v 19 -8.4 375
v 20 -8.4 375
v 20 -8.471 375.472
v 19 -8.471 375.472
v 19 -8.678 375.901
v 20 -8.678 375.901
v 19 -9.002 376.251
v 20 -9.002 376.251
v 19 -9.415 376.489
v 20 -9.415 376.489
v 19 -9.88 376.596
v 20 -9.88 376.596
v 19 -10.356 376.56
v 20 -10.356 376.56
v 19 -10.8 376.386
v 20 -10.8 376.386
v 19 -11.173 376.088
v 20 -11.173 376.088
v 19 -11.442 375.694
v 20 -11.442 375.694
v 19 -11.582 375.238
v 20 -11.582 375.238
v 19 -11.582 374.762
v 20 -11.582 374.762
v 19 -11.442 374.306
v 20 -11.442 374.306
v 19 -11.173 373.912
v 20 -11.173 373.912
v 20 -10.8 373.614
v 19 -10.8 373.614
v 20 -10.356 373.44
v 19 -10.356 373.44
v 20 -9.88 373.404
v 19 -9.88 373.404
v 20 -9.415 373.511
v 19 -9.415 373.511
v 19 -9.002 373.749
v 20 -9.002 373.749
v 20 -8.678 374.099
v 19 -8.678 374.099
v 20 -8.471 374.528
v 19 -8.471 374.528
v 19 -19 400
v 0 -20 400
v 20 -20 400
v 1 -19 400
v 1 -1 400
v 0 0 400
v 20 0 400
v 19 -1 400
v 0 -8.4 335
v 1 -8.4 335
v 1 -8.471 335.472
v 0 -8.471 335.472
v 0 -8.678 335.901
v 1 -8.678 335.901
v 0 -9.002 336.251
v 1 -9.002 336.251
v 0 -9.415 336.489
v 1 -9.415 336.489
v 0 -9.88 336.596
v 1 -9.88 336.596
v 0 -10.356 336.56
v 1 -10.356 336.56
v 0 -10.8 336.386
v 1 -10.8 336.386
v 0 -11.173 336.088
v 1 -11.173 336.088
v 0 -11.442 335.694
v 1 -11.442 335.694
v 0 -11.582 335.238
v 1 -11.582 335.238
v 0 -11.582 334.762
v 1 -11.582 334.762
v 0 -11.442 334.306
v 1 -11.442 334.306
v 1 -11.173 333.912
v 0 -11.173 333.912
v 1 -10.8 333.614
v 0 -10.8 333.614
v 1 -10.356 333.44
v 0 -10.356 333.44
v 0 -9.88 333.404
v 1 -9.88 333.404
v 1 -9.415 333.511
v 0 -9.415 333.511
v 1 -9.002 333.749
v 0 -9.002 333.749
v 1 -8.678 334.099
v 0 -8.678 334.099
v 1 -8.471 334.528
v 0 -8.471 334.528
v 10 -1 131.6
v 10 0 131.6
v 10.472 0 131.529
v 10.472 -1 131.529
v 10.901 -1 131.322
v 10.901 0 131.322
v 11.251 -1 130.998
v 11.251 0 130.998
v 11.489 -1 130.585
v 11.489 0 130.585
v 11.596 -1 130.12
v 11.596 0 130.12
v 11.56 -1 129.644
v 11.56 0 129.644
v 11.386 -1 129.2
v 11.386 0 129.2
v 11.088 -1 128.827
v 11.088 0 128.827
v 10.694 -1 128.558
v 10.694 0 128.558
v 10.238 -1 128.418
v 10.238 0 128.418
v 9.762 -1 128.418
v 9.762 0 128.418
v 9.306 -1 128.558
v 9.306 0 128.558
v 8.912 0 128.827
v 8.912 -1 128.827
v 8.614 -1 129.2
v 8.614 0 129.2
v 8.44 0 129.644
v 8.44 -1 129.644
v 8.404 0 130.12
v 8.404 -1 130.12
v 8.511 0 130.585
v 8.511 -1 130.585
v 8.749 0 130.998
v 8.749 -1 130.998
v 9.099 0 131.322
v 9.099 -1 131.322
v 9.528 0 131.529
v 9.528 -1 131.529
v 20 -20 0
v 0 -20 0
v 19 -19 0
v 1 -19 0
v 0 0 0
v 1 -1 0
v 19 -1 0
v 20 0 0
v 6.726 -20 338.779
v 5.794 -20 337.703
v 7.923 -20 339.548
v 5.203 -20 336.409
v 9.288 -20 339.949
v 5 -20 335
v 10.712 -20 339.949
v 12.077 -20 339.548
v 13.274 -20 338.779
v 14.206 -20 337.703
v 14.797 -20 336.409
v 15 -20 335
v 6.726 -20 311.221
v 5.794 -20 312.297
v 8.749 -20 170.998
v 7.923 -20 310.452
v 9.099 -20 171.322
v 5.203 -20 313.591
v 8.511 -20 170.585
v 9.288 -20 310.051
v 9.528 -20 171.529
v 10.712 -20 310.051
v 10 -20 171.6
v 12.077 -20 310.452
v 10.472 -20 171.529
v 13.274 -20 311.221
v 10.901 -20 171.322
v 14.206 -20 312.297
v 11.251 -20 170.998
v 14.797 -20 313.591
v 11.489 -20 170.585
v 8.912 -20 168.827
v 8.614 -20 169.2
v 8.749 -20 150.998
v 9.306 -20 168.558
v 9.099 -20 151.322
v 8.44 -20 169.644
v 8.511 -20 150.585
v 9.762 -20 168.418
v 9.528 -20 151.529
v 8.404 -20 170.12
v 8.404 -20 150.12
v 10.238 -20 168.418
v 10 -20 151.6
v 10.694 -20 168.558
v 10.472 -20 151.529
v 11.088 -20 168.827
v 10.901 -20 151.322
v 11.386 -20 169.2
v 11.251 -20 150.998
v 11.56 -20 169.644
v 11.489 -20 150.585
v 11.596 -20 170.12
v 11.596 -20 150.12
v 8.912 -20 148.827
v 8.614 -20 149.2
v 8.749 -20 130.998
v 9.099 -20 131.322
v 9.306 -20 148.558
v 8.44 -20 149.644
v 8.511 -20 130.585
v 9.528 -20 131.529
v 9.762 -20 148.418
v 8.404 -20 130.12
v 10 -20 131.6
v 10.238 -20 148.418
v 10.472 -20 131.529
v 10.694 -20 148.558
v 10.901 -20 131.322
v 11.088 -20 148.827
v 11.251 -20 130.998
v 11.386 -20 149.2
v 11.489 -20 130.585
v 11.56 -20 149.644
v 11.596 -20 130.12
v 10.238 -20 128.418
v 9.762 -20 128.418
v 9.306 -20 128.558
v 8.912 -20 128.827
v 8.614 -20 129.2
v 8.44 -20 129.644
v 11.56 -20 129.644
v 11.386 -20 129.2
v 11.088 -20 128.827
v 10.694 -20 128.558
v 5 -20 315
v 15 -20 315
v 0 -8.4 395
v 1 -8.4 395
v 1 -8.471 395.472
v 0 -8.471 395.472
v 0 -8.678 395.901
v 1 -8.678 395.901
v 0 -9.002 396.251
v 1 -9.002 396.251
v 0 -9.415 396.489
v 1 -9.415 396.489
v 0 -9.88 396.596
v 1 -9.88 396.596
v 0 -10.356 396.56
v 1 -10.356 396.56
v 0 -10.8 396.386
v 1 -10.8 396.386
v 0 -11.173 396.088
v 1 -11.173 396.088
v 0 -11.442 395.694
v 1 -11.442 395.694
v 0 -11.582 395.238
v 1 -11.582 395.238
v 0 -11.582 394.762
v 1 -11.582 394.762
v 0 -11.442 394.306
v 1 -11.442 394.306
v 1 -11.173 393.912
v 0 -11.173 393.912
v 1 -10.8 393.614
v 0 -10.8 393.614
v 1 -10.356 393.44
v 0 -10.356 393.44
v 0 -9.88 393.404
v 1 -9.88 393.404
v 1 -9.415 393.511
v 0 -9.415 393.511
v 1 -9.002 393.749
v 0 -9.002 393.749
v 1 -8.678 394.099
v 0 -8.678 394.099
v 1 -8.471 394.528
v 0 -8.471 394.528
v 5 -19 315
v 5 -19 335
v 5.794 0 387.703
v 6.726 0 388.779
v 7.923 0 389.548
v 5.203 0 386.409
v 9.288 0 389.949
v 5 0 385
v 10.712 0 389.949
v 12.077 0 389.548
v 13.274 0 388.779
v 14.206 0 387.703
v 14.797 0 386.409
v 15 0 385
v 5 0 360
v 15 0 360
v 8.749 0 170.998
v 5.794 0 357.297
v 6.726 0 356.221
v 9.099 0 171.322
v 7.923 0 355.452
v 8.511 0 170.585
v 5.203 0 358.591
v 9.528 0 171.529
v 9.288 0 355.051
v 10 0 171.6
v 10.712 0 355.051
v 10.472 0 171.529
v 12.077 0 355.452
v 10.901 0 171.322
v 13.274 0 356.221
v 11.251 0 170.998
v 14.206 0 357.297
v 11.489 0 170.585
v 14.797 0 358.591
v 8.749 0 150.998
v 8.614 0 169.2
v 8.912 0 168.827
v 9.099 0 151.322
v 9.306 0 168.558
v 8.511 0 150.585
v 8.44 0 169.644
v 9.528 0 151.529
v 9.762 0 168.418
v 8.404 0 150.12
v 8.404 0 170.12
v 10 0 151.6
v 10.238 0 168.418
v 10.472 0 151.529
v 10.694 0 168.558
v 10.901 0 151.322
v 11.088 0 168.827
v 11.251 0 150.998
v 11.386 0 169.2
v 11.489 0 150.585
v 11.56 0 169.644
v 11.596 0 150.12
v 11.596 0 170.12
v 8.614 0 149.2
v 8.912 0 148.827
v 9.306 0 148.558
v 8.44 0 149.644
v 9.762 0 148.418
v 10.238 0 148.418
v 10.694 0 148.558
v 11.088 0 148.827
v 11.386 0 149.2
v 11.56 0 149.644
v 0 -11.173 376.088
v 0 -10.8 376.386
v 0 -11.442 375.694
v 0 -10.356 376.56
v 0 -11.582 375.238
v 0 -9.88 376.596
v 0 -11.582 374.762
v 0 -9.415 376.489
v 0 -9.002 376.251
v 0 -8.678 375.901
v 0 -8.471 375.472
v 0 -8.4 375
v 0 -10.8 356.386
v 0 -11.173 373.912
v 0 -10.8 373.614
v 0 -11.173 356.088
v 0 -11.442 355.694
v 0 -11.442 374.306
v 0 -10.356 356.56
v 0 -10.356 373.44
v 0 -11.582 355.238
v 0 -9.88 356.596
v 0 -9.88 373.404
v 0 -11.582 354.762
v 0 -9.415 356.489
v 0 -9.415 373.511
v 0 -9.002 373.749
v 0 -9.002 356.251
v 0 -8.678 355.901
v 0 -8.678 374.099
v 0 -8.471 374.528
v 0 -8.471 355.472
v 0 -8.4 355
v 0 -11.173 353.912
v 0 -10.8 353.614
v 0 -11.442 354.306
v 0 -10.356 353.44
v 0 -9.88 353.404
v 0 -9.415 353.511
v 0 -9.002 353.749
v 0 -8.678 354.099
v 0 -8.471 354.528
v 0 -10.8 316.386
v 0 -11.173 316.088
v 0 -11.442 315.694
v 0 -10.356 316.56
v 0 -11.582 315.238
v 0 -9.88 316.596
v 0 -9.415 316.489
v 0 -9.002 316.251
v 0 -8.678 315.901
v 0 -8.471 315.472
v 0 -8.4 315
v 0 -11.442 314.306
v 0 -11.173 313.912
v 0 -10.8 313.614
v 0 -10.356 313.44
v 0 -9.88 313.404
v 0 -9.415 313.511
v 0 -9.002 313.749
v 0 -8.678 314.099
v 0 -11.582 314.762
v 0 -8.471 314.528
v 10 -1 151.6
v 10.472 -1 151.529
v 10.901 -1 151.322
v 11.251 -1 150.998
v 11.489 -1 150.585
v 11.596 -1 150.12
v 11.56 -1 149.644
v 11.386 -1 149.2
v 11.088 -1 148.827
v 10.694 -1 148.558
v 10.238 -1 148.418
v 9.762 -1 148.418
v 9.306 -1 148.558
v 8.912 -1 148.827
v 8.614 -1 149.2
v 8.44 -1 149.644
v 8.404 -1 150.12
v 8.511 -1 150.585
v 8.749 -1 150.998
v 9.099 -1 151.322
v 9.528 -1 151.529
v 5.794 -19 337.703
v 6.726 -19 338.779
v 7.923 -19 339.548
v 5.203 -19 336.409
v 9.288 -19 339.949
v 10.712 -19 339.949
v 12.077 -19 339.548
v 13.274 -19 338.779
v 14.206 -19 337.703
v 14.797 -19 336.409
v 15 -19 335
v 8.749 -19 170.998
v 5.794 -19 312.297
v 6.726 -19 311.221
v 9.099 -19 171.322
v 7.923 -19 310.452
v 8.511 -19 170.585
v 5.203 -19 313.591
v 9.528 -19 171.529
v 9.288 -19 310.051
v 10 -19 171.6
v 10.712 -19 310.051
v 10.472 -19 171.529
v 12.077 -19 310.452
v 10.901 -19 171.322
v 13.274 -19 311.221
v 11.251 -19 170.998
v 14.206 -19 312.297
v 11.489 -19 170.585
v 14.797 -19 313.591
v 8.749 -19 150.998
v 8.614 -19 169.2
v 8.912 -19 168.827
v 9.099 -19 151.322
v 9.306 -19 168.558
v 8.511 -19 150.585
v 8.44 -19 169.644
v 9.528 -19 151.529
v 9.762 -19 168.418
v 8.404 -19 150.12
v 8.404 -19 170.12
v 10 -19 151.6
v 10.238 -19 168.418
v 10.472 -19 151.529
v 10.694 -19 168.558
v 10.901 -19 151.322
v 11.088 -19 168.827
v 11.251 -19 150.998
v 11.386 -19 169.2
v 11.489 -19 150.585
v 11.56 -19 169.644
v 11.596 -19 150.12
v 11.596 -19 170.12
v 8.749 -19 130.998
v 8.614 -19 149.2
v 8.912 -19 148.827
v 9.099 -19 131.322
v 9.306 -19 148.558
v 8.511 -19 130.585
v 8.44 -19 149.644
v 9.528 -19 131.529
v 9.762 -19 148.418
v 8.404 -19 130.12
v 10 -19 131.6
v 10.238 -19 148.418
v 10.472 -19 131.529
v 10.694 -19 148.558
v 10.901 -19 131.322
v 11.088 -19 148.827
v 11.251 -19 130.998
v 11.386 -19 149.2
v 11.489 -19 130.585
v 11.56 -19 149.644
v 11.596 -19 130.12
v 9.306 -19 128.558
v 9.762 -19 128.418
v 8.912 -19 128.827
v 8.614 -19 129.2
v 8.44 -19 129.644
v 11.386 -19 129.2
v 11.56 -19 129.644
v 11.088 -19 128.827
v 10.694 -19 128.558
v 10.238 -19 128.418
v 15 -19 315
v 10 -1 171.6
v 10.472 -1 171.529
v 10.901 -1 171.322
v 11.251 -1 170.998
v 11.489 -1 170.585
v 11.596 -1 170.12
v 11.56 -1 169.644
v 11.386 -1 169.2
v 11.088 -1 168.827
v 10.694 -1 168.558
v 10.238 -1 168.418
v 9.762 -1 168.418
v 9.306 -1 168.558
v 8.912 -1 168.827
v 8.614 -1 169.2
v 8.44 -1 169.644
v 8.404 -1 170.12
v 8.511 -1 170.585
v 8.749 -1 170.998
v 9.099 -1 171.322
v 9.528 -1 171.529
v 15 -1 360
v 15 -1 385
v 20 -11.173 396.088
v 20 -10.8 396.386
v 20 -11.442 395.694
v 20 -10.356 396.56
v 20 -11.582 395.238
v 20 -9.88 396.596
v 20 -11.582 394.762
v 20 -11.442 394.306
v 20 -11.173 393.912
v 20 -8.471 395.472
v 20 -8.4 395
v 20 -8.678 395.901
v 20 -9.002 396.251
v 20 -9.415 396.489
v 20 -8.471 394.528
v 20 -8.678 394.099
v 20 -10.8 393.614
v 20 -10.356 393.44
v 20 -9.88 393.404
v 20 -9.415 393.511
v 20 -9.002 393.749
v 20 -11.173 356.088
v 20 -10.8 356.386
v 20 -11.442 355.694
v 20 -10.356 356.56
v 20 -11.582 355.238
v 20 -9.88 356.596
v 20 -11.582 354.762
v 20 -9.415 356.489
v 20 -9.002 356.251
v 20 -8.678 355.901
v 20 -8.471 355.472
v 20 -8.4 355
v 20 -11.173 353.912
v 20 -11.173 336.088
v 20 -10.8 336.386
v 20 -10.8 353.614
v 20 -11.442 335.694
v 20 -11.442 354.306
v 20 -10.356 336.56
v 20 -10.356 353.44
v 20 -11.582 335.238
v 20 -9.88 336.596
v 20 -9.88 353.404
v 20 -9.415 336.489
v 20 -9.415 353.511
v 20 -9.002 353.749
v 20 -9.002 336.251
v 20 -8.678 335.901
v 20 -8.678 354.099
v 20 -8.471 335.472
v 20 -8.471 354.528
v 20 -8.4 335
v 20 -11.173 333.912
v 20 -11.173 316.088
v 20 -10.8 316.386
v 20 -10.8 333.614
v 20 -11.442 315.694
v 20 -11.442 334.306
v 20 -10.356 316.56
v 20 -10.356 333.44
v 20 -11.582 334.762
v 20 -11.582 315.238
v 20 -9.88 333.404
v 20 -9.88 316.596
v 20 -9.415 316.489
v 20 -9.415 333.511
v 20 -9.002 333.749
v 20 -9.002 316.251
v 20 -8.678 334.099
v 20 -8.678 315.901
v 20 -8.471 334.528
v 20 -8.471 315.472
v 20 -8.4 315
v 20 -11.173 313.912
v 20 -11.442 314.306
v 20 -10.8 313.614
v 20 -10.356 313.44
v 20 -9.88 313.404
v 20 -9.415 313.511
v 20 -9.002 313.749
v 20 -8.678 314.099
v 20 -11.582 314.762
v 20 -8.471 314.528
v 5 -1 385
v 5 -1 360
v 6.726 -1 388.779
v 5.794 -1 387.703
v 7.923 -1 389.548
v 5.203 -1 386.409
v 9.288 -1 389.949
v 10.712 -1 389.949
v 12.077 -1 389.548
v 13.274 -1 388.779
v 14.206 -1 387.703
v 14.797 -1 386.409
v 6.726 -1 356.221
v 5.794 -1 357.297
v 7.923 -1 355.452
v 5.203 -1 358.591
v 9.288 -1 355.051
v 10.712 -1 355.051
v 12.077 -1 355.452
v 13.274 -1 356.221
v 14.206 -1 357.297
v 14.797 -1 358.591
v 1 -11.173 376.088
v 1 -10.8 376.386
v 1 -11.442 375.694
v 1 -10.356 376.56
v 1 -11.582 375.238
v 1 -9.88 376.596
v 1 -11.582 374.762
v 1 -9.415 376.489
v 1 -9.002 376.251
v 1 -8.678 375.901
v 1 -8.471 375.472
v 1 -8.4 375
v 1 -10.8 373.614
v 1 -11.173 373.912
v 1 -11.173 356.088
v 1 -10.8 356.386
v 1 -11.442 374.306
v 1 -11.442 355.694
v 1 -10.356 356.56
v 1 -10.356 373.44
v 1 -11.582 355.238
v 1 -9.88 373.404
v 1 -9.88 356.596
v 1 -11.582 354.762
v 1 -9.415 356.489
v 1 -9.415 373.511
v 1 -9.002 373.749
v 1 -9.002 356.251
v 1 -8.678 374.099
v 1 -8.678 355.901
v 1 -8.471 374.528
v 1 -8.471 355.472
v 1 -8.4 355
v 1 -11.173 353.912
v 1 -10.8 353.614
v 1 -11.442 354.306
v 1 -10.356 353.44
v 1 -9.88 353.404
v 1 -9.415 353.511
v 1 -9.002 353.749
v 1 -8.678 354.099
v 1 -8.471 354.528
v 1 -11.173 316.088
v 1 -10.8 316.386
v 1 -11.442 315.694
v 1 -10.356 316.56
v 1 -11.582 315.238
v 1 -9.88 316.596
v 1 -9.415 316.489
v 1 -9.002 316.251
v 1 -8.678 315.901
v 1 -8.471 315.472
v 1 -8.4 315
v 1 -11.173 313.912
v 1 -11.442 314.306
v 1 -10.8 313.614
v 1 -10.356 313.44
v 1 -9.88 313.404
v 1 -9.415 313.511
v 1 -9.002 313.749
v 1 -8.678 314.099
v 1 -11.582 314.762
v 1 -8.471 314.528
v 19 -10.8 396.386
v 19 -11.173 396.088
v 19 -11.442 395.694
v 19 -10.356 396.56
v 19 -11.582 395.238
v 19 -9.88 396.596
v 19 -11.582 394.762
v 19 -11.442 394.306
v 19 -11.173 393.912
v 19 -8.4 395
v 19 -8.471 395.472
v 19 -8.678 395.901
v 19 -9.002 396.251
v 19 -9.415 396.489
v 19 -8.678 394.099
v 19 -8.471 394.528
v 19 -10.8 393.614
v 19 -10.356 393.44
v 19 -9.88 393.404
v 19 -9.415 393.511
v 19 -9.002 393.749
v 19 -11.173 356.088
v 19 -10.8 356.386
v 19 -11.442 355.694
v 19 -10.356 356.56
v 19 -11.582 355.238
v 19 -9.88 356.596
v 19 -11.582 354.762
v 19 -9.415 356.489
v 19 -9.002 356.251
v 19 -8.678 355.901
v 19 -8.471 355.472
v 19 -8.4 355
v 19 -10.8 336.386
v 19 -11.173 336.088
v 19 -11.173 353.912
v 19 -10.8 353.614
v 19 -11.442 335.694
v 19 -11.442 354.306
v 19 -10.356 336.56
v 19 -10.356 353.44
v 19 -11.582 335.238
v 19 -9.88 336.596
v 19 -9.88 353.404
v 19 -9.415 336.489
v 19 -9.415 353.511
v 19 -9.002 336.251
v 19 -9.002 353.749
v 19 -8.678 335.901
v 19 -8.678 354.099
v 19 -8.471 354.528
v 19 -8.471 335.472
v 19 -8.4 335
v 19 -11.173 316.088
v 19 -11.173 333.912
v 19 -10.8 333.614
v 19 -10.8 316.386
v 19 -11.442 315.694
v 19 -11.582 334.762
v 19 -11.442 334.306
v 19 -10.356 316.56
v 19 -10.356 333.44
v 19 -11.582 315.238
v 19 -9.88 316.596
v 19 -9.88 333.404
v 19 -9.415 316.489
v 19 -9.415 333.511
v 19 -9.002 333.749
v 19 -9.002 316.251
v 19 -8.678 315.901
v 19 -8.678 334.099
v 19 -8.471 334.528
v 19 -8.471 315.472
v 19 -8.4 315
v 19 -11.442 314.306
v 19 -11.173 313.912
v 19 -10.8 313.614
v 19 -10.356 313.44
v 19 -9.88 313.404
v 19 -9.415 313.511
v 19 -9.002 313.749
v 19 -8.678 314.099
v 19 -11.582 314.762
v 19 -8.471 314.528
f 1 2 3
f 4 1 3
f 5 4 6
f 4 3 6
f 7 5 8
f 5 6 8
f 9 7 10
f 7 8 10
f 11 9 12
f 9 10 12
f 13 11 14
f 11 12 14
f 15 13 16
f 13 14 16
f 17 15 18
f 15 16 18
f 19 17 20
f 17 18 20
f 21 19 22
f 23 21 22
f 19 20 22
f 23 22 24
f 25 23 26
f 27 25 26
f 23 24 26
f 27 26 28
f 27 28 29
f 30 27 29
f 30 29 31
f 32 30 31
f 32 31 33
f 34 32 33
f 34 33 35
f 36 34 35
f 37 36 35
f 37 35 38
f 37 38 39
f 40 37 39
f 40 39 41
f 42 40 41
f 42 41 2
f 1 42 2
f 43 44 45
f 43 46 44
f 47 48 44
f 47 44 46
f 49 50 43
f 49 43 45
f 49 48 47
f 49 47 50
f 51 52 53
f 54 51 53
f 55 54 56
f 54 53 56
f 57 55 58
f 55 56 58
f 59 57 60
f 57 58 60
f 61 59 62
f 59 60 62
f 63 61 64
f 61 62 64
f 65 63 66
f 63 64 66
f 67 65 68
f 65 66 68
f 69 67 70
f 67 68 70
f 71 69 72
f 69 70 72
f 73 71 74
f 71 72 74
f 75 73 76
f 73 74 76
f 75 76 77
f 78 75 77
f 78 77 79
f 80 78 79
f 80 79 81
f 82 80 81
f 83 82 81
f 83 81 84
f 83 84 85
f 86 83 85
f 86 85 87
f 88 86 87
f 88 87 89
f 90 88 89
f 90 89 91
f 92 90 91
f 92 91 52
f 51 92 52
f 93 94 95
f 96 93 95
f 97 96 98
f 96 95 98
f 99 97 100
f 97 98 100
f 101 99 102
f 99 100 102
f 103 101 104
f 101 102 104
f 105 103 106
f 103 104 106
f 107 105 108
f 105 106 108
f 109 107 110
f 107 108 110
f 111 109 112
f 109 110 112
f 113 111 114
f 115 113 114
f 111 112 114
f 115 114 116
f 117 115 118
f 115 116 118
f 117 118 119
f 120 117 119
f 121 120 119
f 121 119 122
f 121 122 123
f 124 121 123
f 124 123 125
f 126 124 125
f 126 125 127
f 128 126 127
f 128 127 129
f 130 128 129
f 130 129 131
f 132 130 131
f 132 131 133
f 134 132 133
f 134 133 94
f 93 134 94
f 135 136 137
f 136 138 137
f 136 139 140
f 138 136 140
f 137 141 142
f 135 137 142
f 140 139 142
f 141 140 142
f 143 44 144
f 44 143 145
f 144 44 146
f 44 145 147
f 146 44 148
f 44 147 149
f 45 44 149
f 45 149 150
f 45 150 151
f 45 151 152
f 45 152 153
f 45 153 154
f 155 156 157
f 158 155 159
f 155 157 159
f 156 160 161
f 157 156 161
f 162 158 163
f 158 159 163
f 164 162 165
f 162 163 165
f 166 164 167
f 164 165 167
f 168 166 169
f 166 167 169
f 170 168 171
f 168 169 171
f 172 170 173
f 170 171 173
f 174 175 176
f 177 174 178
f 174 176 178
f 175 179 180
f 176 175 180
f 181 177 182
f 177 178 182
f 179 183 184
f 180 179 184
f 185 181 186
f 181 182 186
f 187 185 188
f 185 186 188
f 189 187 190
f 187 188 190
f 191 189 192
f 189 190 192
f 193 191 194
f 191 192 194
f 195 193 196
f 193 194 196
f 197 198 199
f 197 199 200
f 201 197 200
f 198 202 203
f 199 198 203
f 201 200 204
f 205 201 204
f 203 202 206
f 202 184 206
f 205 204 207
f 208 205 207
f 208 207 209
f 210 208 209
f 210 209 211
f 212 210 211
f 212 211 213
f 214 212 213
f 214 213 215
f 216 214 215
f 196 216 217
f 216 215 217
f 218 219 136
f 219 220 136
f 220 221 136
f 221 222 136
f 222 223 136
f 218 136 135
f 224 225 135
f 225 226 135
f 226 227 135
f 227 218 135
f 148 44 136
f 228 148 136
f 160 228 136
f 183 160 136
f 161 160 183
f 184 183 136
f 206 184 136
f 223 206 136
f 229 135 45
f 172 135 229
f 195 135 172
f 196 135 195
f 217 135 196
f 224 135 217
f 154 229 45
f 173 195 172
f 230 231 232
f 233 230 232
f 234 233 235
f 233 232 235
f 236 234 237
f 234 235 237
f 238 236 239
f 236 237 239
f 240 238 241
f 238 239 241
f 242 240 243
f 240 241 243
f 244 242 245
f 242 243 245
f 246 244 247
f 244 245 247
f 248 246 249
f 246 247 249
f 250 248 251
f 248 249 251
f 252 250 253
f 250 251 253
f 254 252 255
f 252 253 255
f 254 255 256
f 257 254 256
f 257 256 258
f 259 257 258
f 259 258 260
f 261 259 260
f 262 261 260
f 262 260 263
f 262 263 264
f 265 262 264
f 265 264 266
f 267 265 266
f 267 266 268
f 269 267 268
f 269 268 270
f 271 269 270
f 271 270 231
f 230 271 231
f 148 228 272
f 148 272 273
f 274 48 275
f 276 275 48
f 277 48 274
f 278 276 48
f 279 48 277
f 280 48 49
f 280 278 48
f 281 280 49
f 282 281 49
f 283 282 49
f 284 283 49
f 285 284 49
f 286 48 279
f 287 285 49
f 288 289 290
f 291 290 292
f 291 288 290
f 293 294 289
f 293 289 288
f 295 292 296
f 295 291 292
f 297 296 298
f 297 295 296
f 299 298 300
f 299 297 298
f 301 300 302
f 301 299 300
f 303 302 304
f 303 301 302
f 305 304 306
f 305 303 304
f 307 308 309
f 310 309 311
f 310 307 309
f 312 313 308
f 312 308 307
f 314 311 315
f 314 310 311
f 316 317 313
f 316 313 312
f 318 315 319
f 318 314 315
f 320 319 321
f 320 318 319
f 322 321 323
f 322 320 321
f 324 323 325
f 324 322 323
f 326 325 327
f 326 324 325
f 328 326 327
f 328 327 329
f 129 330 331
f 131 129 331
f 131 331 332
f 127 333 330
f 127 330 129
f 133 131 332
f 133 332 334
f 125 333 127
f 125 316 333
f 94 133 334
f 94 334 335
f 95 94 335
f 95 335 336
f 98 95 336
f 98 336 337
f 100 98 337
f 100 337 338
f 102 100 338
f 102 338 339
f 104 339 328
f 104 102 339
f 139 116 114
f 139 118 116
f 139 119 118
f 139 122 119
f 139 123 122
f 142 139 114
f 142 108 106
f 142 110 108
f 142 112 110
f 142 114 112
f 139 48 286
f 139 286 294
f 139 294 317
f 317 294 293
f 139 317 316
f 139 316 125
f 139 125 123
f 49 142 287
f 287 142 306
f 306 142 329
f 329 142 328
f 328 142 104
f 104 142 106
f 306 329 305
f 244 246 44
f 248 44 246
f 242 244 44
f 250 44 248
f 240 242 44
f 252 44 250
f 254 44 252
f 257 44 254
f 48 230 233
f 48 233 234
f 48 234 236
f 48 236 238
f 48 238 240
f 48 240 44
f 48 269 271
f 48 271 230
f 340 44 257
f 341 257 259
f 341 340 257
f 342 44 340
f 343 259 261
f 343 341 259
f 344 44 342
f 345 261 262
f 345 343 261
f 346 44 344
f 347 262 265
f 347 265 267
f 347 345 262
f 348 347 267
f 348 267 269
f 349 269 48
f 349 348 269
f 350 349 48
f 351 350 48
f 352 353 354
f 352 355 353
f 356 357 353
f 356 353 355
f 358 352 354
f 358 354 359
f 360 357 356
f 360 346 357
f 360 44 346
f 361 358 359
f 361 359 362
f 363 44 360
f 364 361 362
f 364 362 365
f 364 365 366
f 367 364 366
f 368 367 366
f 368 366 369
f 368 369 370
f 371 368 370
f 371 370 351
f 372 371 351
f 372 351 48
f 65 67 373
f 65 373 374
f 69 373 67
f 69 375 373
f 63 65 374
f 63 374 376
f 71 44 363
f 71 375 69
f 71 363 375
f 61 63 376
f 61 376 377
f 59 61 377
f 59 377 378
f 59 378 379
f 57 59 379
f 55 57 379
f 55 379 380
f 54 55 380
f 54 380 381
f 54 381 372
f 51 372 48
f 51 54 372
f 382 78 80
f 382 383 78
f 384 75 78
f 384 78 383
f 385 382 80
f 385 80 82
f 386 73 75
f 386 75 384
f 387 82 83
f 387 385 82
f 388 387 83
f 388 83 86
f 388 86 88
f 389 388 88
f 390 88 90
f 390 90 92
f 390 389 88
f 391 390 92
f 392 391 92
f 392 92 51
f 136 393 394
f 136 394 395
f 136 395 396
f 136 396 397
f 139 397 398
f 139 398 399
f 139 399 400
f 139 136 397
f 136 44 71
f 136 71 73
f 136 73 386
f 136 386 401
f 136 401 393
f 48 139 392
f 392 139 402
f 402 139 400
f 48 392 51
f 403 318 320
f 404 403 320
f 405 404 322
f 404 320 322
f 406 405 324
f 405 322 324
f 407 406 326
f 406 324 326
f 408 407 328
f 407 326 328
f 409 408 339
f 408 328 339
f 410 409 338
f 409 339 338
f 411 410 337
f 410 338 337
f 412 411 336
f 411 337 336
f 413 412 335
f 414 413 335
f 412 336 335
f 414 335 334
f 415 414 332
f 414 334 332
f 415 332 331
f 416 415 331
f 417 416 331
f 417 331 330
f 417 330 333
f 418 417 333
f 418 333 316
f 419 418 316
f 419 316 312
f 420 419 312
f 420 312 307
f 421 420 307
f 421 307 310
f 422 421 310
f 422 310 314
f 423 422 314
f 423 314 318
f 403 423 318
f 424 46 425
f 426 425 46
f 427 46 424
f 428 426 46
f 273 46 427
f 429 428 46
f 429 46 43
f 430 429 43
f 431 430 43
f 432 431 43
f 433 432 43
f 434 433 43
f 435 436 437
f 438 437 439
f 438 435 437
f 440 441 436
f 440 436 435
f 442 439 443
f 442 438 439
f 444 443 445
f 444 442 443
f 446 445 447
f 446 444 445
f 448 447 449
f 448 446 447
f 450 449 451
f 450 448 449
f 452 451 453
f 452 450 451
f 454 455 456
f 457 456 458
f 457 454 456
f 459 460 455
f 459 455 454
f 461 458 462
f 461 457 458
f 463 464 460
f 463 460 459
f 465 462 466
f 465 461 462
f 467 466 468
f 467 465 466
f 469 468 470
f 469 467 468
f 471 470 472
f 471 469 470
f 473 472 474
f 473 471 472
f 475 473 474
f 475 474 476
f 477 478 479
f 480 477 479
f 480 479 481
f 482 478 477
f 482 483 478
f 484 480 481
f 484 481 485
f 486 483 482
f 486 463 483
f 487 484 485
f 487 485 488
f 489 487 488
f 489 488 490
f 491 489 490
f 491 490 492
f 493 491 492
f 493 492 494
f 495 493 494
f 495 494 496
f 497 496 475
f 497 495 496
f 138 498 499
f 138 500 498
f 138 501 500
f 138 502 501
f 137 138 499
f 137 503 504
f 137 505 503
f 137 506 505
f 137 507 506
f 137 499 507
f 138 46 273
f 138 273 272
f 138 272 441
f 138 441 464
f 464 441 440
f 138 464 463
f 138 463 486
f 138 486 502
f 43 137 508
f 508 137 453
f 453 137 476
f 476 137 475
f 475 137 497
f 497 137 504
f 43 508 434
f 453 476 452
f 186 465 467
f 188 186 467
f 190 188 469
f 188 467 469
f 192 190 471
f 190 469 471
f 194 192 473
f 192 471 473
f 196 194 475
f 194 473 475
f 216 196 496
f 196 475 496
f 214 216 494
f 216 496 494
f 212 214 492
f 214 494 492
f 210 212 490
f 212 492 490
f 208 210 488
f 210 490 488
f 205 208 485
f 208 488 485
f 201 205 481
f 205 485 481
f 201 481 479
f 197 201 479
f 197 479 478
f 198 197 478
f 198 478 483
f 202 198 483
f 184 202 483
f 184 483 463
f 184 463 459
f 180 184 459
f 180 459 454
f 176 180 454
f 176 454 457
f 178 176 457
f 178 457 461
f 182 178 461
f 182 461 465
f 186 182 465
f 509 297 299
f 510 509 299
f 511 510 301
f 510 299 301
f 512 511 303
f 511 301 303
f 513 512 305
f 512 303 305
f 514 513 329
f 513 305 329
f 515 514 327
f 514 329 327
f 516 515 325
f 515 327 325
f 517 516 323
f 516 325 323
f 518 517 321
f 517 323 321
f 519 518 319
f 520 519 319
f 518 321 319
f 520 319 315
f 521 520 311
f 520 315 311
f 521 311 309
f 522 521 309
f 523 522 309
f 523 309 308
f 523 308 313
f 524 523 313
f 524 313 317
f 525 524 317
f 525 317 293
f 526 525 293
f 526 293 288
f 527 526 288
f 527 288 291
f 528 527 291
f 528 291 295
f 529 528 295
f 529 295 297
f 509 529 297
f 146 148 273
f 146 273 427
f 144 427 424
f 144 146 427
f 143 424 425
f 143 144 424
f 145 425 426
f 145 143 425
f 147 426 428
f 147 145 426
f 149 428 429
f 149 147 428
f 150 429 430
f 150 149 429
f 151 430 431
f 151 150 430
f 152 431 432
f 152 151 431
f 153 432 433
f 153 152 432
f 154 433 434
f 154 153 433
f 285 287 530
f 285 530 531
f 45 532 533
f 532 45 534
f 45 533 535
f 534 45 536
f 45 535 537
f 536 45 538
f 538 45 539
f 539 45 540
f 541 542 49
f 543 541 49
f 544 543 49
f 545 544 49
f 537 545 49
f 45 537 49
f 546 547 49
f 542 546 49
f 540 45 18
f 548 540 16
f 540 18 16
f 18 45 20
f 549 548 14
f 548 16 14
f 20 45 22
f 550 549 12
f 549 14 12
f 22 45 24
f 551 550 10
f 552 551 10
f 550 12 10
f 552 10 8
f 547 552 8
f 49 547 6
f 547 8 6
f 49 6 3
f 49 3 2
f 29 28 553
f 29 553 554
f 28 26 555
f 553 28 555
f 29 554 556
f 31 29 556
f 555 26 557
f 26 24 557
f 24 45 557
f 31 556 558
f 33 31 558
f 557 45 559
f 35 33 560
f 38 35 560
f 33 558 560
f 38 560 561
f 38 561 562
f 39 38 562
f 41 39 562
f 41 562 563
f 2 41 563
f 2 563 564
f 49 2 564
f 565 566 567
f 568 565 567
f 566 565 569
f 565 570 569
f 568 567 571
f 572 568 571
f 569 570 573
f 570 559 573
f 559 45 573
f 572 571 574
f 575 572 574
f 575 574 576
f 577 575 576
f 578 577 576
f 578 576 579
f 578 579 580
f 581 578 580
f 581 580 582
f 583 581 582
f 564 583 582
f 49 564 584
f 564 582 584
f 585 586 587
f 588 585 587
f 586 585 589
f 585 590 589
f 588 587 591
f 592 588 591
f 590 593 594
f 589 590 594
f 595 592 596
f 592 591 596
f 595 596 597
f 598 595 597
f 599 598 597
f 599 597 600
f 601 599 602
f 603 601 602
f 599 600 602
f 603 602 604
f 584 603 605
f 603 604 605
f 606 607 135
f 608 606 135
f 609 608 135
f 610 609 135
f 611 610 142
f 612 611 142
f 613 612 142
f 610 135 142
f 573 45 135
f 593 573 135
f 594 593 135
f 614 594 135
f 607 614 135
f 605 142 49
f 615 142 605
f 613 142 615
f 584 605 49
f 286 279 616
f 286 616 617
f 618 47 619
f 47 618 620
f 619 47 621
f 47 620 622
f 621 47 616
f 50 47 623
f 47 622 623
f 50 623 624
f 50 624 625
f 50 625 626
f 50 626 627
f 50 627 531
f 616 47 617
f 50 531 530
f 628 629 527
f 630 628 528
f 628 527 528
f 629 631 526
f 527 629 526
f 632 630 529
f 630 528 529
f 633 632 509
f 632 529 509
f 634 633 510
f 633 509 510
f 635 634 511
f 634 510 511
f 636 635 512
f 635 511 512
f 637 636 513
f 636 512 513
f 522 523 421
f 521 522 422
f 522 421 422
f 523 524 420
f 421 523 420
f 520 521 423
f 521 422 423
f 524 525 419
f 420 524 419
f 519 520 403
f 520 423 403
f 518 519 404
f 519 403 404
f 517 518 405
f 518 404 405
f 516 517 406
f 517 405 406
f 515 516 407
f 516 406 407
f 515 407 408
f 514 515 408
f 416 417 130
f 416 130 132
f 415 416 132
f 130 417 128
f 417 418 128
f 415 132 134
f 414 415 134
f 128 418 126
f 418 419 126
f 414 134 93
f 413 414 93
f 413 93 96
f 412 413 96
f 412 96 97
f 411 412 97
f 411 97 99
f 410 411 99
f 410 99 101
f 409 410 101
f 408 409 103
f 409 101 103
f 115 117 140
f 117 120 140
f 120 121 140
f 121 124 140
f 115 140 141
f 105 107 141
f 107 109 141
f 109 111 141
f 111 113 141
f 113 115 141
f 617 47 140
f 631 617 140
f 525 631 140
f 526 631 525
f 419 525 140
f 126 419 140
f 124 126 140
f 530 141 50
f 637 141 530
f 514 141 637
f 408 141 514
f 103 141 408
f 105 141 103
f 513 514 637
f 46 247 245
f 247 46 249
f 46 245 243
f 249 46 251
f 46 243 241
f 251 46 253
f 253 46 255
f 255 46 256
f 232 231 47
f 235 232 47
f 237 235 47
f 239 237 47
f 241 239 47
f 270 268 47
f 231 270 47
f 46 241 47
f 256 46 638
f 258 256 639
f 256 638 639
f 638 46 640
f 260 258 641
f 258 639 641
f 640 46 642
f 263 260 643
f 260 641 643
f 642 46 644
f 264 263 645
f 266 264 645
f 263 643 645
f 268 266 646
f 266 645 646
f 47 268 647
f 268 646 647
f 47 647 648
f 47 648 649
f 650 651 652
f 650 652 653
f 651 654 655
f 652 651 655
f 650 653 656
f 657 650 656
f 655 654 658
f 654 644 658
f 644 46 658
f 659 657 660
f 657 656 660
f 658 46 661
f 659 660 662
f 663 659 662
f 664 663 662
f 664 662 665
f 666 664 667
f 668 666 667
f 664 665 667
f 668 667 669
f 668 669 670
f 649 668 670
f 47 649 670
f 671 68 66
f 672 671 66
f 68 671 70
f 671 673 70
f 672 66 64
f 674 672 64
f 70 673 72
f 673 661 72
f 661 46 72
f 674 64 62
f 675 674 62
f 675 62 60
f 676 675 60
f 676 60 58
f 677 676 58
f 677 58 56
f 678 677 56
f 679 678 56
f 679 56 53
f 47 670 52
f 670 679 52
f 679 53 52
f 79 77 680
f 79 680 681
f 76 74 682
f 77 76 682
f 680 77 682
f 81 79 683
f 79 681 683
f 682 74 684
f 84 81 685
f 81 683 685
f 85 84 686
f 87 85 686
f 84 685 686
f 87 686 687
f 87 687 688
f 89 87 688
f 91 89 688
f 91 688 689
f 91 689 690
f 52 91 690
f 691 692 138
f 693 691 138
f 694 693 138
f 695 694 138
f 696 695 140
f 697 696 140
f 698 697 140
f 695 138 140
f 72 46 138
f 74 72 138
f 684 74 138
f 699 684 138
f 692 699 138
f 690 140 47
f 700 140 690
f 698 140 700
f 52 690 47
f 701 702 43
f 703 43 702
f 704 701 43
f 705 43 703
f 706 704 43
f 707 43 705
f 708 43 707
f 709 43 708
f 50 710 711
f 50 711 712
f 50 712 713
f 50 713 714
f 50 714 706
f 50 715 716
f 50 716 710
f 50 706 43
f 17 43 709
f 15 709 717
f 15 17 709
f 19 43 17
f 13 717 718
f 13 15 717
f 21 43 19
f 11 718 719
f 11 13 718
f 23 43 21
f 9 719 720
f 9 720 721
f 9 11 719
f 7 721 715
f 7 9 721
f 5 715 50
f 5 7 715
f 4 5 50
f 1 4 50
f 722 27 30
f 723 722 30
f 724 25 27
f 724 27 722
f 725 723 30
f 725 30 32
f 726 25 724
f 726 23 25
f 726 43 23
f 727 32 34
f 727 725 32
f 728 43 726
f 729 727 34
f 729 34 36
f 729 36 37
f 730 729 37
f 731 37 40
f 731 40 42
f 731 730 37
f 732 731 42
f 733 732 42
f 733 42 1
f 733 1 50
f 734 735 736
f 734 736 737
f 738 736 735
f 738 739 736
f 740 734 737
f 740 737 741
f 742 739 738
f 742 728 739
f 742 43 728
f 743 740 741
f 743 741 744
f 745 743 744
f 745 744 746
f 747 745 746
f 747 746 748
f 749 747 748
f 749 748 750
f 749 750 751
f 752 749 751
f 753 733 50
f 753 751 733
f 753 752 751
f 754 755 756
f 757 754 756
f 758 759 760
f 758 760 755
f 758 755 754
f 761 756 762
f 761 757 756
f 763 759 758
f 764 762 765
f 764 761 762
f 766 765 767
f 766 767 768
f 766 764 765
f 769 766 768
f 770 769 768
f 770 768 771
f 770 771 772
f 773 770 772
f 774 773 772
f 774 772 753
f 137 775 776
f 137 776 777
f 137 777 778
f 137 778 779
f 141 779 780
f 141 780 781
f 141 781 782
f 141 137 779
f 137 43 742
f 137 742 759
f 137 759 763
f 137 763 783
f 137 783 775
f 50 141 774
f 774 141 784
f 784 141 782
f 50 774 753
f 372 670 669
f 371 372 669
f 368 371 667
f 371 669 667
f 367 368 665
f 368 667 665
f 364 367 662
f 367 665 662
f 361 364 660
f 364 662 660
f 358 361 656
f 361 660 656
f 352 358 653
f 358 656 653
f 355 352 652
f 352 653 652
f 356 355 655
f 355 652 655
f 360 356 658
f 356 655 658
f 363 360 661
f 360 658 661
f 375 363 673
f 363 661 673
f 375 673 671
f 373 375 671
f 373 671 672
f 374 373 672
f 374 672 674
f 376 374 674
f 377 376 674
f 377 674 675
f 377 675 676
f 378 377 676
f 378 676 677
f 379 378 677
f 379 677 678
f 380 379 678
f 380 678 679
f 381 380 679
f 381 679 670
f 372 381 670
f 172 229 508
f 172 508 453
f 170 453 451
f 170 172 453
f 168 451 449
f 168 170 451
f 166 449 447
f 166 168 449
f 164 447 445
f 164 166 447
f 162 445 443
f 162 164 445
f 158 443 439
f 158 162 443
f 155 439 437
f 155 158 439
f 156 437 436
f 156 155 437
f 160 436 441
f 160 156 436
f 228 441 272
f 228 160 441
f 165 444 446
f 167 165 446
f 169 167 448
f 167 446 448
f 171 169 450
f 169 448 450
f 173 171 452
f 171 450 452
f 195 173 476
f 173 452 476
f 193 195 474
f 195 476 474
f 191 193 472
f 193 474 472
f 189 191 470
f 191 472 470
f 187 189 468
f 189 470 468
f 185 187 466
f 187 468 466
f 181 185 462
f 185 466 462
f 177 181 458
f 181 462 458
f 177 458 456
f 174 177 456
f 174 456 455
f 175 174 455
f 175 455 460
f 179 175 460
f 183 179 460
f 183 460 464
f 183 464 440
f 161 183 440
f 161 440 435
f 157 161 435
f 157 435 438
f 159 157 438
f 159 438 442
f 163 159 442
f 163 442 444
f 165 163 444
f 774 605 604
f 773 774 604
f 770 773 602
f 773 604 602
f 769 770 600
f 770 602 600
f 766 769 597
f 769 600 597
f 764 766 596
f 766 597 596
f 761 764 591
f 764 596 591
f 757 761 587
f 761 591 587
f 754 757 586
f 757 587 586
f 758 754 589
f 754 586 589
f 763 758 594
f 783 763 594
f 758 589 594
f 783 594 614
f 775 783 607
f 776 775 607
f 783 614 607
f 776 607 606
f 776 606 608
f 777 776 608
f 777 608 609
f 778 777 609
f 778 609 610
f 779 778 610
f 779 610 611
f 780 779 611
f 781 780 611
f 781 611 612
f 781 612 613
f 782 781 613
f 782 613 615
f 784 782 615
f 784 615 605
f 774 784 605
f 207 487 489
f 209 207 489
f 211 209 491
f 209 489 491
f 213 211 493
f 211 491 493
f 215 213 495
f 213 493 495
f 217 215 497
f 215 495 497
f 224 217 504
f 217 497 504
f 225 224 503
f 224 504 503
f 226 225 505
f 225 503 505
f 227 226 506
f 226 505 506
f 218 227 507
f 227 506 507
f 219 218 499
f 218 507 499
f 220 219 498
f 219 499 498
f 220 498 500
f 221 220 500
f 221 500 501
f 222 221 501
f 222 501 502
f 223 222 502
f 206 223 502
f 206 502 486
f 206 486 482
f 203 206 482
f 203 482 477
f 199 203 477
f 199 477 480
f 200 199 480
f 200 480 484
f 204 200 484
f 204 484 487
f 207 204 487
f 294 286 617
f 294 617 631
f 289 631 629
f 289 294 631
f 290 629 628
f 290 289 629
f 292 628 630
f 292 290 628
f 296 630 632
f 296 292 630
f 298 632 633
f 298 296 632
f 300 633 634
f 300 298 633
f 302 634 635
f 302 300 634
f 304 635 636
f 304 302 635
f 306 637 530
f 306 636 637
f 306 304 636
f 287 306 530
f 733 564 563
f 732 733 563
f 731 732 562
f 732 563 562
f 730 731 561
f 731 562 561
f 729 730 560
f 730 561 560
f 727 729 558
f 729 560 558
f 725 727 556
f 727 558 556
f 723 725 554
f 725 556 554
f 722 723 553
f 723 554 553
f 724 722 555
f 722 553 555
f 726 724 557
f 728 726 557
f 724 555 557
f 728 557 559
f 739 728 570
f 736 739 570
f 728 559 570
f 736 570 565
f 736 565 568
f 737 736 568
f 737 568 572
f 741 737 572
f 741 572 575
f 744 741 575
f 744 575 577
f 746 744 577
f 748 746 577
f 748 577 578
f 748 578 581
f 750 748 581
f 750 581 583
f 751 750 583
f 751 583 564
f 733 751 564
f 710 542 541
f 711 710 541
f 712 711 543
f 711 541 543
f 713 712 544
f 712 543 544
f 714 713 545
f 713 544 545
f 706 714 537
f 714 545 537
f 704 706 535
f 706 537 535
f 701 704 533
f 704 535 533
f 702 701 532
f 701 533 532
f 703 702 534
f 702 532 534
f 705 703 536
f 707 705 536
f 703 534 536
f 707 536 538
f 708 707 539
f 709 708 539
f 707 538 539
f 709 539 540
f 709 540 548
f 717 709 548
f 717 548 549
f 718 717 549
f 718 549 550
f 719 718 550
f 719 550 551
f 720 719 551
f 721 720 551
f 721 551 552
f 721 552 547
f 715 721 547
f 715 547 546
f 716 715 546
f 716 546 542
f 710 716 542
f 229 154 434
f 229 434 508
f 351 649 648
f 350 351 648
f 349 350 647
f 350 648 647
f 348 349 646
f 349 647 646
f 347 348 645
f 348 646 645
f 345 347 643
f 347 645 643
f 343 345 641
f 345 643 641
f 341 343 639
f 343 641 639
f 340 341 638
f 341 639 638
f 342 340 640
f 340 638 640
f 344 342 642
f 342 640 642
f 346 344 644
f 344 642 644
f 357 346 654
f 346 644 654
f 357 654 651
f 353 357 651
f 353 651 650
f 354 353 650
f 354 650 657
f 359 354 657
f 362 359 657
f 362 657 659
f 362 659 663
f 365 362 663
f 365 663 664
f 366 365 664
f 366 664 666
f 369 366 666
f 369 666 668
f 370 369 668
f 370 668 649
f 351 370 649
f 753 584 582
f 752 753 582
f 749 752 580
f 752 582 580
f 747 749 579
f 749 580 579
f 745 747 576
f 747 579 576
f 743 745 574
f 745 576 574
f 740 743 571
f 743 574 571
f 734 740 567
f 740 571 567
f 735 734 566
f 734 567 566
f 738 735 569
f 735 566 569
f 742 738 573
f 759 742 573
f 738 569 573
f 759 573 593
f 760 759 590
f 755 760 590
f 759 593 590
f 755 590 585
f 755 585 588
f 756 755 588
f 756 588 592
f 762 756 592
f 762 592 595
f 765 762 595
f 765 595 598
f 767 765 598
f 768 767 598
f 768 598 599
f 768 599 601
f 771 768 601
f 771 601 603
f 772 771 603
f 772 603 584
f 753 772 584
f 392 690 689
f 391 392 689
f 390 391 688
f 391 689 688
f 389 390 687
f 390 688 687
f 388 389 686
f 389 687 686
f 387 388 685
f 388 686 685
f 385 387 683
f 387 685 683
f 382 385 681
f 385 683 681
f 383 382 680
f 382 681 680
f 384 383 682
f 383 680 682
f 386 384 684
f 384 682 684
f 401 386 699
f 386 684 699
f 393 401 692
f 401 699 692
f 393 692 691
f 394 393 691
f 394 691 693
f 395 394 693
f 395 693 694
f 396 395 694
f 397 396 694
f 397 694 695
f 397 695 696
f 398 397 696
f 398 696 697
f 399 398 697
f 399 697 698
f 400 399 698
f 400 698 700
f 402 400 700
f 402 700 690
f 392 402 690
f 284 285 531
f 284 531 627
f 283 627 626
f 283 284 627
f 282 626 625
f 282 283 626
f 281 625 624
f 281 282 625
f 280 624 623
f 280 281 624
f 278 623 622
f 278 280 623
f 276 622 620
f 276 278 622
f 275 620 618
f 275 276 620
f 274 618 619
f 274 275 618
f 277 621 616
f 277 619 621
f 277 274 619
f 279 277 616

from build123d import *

# Parameters (mm, degrees)
SKETCH_1_W          = 20
SKETCH_1_H          = 20
SKETCH_1_W_2        = 18
SKETCH_1_H_2        = 18
EXTRUDE_1_DEPTH     = 400
SKETCH_2_R          = 1.6
CUT_EXTRUDE_1_DEPTH = 401.998753115
CUT_EXTRUDE_2_REACH = 402.999
CUT_EXTRUDE_3_REACH = 402.999
SKETCH_5_R          = 1.6
CUT_EXTRUDE_4_DEPTH = 401.998753115


with BuildPart() as part:
    # 草图1 → 拉伸-薄壁1 (new body)
    with BuildSketch(Plane.XY):
        with Locations((10, -10)):
            Rectangle(SKETCH_1_W, SKETCH_1_H)
        with Locations((10, -10)):
            Rectangle(SKETCH_1_W_2, SKETCH_1_H_2, mode=Mode.SUBTRACT)
    extrude(amount=EXTRUDE_1_DEPTH)

    # 草图2 → 切除-拉伸1 (cut, through all)
    with BuildSketch(Plane(origin=(20, 0, 0), x_dir=(0, 0, -1), z_dir=(1, 0, 0))):
        with Locations(Location((-395, -10, 0), (0, 0, 90))):
            Circle(SKETCH_2_R)
        with Locations(Location((-375, -10, 0), (0, 0, 90))):
            Circle(SKETCH_2_R)
        with Locations(Location((-355, -10, 0), (0, 0, 90))):
            Circle(SKETCH_2_R)
        with Locations(Location((-335, -10, 0), (0, 0, 90))):
            Circle(SKETCH_2_R)
        with Locations(Location((-315, -10, 0), (0, 0, 90))):
            Circle(SKETCH_2_R)
    extrude(amount=-CUT_EXTRUDE_1_DEPTH, mode=Mode.SUBTRACT)

    # 草图3 → 切除-拉伸2 (cut, up to next)
    with BuildSketch(Plane(origin=(0, 0, 0), x_dir=(1, 0, 0), z_dir=(0, 1, 0)), mode=Mode.PRIVATE) as cut_extrude_2_sk1:
        with BuildLine():
            Line((15, -360), (15, -385))
            ThreePointArc((15, -385), (10, -390), (5, -385))
            Line((5, -385), (5, -360))
            ThreePointArc((5, -360), (10, -355), (15, -360))
        make_face()
    cut_extrude_2_tool1 = extrude(cut_extrude_2_sk1.sketch, amount=-CUT_EXTRUDE_2_REACH, mode=Mode.PRIVATE) & part.part
    add(cut_extrude_2_tool1.solids().sort_by_distance((10, 0, 372.5))[0], mode=Mode.SUBTRACT)

    # 草图4 → 切除-拉伸3 (cut, up to next)
    with BuildSketch(Plane.XZ.offset(20), mode=Mode.PRIVATE) as cut_extrude_3_sk1:
        with BuildLine():
            Line((15, 335), (15, 315))
            ThreePointArc((15, 315), (10, 310), (5, 315))
            Line((5, 315), (5, 335))
            ThreePointArc((5, 335), (10, 340), (15, 335))
        make_face()
    cut_extrude_3_tool1 = extrude(cut_extrude_3_sk1.sketch, amount=-CUT_EXTRUDE_3_REACH, mode=Mode.PRIVATE) & part.part
    add(cut_extrude_3_tool1.solids().sort_by_distance((10, -20, 325))[0], mode=Mode.SUBTRACT)

    # 草图5 → 切除-拉伸4 (cut, through all)
    with BuildSketch(Plane(origin=(0, 0, 0), x_dir=(1, 0, 0), z_dir=(0, 1, 0))):
        with Locations(Location((10, -130, 0), (0, 0, 270))):
            Circle(SKETCH_5_R)
        with Locations(Location((10, -150, 0), (0, 0, 270))):
            Circle(SKETCH_5_R)
        with Locations(Location((10, -170, 0), (0, 0, 270))):
            Circle(SKETCH_5_R)
    extrude(amount=-CUT_EXTRUDE_4_DEPTH, mode=Mode.SUBTRACT)


solid = part.part
